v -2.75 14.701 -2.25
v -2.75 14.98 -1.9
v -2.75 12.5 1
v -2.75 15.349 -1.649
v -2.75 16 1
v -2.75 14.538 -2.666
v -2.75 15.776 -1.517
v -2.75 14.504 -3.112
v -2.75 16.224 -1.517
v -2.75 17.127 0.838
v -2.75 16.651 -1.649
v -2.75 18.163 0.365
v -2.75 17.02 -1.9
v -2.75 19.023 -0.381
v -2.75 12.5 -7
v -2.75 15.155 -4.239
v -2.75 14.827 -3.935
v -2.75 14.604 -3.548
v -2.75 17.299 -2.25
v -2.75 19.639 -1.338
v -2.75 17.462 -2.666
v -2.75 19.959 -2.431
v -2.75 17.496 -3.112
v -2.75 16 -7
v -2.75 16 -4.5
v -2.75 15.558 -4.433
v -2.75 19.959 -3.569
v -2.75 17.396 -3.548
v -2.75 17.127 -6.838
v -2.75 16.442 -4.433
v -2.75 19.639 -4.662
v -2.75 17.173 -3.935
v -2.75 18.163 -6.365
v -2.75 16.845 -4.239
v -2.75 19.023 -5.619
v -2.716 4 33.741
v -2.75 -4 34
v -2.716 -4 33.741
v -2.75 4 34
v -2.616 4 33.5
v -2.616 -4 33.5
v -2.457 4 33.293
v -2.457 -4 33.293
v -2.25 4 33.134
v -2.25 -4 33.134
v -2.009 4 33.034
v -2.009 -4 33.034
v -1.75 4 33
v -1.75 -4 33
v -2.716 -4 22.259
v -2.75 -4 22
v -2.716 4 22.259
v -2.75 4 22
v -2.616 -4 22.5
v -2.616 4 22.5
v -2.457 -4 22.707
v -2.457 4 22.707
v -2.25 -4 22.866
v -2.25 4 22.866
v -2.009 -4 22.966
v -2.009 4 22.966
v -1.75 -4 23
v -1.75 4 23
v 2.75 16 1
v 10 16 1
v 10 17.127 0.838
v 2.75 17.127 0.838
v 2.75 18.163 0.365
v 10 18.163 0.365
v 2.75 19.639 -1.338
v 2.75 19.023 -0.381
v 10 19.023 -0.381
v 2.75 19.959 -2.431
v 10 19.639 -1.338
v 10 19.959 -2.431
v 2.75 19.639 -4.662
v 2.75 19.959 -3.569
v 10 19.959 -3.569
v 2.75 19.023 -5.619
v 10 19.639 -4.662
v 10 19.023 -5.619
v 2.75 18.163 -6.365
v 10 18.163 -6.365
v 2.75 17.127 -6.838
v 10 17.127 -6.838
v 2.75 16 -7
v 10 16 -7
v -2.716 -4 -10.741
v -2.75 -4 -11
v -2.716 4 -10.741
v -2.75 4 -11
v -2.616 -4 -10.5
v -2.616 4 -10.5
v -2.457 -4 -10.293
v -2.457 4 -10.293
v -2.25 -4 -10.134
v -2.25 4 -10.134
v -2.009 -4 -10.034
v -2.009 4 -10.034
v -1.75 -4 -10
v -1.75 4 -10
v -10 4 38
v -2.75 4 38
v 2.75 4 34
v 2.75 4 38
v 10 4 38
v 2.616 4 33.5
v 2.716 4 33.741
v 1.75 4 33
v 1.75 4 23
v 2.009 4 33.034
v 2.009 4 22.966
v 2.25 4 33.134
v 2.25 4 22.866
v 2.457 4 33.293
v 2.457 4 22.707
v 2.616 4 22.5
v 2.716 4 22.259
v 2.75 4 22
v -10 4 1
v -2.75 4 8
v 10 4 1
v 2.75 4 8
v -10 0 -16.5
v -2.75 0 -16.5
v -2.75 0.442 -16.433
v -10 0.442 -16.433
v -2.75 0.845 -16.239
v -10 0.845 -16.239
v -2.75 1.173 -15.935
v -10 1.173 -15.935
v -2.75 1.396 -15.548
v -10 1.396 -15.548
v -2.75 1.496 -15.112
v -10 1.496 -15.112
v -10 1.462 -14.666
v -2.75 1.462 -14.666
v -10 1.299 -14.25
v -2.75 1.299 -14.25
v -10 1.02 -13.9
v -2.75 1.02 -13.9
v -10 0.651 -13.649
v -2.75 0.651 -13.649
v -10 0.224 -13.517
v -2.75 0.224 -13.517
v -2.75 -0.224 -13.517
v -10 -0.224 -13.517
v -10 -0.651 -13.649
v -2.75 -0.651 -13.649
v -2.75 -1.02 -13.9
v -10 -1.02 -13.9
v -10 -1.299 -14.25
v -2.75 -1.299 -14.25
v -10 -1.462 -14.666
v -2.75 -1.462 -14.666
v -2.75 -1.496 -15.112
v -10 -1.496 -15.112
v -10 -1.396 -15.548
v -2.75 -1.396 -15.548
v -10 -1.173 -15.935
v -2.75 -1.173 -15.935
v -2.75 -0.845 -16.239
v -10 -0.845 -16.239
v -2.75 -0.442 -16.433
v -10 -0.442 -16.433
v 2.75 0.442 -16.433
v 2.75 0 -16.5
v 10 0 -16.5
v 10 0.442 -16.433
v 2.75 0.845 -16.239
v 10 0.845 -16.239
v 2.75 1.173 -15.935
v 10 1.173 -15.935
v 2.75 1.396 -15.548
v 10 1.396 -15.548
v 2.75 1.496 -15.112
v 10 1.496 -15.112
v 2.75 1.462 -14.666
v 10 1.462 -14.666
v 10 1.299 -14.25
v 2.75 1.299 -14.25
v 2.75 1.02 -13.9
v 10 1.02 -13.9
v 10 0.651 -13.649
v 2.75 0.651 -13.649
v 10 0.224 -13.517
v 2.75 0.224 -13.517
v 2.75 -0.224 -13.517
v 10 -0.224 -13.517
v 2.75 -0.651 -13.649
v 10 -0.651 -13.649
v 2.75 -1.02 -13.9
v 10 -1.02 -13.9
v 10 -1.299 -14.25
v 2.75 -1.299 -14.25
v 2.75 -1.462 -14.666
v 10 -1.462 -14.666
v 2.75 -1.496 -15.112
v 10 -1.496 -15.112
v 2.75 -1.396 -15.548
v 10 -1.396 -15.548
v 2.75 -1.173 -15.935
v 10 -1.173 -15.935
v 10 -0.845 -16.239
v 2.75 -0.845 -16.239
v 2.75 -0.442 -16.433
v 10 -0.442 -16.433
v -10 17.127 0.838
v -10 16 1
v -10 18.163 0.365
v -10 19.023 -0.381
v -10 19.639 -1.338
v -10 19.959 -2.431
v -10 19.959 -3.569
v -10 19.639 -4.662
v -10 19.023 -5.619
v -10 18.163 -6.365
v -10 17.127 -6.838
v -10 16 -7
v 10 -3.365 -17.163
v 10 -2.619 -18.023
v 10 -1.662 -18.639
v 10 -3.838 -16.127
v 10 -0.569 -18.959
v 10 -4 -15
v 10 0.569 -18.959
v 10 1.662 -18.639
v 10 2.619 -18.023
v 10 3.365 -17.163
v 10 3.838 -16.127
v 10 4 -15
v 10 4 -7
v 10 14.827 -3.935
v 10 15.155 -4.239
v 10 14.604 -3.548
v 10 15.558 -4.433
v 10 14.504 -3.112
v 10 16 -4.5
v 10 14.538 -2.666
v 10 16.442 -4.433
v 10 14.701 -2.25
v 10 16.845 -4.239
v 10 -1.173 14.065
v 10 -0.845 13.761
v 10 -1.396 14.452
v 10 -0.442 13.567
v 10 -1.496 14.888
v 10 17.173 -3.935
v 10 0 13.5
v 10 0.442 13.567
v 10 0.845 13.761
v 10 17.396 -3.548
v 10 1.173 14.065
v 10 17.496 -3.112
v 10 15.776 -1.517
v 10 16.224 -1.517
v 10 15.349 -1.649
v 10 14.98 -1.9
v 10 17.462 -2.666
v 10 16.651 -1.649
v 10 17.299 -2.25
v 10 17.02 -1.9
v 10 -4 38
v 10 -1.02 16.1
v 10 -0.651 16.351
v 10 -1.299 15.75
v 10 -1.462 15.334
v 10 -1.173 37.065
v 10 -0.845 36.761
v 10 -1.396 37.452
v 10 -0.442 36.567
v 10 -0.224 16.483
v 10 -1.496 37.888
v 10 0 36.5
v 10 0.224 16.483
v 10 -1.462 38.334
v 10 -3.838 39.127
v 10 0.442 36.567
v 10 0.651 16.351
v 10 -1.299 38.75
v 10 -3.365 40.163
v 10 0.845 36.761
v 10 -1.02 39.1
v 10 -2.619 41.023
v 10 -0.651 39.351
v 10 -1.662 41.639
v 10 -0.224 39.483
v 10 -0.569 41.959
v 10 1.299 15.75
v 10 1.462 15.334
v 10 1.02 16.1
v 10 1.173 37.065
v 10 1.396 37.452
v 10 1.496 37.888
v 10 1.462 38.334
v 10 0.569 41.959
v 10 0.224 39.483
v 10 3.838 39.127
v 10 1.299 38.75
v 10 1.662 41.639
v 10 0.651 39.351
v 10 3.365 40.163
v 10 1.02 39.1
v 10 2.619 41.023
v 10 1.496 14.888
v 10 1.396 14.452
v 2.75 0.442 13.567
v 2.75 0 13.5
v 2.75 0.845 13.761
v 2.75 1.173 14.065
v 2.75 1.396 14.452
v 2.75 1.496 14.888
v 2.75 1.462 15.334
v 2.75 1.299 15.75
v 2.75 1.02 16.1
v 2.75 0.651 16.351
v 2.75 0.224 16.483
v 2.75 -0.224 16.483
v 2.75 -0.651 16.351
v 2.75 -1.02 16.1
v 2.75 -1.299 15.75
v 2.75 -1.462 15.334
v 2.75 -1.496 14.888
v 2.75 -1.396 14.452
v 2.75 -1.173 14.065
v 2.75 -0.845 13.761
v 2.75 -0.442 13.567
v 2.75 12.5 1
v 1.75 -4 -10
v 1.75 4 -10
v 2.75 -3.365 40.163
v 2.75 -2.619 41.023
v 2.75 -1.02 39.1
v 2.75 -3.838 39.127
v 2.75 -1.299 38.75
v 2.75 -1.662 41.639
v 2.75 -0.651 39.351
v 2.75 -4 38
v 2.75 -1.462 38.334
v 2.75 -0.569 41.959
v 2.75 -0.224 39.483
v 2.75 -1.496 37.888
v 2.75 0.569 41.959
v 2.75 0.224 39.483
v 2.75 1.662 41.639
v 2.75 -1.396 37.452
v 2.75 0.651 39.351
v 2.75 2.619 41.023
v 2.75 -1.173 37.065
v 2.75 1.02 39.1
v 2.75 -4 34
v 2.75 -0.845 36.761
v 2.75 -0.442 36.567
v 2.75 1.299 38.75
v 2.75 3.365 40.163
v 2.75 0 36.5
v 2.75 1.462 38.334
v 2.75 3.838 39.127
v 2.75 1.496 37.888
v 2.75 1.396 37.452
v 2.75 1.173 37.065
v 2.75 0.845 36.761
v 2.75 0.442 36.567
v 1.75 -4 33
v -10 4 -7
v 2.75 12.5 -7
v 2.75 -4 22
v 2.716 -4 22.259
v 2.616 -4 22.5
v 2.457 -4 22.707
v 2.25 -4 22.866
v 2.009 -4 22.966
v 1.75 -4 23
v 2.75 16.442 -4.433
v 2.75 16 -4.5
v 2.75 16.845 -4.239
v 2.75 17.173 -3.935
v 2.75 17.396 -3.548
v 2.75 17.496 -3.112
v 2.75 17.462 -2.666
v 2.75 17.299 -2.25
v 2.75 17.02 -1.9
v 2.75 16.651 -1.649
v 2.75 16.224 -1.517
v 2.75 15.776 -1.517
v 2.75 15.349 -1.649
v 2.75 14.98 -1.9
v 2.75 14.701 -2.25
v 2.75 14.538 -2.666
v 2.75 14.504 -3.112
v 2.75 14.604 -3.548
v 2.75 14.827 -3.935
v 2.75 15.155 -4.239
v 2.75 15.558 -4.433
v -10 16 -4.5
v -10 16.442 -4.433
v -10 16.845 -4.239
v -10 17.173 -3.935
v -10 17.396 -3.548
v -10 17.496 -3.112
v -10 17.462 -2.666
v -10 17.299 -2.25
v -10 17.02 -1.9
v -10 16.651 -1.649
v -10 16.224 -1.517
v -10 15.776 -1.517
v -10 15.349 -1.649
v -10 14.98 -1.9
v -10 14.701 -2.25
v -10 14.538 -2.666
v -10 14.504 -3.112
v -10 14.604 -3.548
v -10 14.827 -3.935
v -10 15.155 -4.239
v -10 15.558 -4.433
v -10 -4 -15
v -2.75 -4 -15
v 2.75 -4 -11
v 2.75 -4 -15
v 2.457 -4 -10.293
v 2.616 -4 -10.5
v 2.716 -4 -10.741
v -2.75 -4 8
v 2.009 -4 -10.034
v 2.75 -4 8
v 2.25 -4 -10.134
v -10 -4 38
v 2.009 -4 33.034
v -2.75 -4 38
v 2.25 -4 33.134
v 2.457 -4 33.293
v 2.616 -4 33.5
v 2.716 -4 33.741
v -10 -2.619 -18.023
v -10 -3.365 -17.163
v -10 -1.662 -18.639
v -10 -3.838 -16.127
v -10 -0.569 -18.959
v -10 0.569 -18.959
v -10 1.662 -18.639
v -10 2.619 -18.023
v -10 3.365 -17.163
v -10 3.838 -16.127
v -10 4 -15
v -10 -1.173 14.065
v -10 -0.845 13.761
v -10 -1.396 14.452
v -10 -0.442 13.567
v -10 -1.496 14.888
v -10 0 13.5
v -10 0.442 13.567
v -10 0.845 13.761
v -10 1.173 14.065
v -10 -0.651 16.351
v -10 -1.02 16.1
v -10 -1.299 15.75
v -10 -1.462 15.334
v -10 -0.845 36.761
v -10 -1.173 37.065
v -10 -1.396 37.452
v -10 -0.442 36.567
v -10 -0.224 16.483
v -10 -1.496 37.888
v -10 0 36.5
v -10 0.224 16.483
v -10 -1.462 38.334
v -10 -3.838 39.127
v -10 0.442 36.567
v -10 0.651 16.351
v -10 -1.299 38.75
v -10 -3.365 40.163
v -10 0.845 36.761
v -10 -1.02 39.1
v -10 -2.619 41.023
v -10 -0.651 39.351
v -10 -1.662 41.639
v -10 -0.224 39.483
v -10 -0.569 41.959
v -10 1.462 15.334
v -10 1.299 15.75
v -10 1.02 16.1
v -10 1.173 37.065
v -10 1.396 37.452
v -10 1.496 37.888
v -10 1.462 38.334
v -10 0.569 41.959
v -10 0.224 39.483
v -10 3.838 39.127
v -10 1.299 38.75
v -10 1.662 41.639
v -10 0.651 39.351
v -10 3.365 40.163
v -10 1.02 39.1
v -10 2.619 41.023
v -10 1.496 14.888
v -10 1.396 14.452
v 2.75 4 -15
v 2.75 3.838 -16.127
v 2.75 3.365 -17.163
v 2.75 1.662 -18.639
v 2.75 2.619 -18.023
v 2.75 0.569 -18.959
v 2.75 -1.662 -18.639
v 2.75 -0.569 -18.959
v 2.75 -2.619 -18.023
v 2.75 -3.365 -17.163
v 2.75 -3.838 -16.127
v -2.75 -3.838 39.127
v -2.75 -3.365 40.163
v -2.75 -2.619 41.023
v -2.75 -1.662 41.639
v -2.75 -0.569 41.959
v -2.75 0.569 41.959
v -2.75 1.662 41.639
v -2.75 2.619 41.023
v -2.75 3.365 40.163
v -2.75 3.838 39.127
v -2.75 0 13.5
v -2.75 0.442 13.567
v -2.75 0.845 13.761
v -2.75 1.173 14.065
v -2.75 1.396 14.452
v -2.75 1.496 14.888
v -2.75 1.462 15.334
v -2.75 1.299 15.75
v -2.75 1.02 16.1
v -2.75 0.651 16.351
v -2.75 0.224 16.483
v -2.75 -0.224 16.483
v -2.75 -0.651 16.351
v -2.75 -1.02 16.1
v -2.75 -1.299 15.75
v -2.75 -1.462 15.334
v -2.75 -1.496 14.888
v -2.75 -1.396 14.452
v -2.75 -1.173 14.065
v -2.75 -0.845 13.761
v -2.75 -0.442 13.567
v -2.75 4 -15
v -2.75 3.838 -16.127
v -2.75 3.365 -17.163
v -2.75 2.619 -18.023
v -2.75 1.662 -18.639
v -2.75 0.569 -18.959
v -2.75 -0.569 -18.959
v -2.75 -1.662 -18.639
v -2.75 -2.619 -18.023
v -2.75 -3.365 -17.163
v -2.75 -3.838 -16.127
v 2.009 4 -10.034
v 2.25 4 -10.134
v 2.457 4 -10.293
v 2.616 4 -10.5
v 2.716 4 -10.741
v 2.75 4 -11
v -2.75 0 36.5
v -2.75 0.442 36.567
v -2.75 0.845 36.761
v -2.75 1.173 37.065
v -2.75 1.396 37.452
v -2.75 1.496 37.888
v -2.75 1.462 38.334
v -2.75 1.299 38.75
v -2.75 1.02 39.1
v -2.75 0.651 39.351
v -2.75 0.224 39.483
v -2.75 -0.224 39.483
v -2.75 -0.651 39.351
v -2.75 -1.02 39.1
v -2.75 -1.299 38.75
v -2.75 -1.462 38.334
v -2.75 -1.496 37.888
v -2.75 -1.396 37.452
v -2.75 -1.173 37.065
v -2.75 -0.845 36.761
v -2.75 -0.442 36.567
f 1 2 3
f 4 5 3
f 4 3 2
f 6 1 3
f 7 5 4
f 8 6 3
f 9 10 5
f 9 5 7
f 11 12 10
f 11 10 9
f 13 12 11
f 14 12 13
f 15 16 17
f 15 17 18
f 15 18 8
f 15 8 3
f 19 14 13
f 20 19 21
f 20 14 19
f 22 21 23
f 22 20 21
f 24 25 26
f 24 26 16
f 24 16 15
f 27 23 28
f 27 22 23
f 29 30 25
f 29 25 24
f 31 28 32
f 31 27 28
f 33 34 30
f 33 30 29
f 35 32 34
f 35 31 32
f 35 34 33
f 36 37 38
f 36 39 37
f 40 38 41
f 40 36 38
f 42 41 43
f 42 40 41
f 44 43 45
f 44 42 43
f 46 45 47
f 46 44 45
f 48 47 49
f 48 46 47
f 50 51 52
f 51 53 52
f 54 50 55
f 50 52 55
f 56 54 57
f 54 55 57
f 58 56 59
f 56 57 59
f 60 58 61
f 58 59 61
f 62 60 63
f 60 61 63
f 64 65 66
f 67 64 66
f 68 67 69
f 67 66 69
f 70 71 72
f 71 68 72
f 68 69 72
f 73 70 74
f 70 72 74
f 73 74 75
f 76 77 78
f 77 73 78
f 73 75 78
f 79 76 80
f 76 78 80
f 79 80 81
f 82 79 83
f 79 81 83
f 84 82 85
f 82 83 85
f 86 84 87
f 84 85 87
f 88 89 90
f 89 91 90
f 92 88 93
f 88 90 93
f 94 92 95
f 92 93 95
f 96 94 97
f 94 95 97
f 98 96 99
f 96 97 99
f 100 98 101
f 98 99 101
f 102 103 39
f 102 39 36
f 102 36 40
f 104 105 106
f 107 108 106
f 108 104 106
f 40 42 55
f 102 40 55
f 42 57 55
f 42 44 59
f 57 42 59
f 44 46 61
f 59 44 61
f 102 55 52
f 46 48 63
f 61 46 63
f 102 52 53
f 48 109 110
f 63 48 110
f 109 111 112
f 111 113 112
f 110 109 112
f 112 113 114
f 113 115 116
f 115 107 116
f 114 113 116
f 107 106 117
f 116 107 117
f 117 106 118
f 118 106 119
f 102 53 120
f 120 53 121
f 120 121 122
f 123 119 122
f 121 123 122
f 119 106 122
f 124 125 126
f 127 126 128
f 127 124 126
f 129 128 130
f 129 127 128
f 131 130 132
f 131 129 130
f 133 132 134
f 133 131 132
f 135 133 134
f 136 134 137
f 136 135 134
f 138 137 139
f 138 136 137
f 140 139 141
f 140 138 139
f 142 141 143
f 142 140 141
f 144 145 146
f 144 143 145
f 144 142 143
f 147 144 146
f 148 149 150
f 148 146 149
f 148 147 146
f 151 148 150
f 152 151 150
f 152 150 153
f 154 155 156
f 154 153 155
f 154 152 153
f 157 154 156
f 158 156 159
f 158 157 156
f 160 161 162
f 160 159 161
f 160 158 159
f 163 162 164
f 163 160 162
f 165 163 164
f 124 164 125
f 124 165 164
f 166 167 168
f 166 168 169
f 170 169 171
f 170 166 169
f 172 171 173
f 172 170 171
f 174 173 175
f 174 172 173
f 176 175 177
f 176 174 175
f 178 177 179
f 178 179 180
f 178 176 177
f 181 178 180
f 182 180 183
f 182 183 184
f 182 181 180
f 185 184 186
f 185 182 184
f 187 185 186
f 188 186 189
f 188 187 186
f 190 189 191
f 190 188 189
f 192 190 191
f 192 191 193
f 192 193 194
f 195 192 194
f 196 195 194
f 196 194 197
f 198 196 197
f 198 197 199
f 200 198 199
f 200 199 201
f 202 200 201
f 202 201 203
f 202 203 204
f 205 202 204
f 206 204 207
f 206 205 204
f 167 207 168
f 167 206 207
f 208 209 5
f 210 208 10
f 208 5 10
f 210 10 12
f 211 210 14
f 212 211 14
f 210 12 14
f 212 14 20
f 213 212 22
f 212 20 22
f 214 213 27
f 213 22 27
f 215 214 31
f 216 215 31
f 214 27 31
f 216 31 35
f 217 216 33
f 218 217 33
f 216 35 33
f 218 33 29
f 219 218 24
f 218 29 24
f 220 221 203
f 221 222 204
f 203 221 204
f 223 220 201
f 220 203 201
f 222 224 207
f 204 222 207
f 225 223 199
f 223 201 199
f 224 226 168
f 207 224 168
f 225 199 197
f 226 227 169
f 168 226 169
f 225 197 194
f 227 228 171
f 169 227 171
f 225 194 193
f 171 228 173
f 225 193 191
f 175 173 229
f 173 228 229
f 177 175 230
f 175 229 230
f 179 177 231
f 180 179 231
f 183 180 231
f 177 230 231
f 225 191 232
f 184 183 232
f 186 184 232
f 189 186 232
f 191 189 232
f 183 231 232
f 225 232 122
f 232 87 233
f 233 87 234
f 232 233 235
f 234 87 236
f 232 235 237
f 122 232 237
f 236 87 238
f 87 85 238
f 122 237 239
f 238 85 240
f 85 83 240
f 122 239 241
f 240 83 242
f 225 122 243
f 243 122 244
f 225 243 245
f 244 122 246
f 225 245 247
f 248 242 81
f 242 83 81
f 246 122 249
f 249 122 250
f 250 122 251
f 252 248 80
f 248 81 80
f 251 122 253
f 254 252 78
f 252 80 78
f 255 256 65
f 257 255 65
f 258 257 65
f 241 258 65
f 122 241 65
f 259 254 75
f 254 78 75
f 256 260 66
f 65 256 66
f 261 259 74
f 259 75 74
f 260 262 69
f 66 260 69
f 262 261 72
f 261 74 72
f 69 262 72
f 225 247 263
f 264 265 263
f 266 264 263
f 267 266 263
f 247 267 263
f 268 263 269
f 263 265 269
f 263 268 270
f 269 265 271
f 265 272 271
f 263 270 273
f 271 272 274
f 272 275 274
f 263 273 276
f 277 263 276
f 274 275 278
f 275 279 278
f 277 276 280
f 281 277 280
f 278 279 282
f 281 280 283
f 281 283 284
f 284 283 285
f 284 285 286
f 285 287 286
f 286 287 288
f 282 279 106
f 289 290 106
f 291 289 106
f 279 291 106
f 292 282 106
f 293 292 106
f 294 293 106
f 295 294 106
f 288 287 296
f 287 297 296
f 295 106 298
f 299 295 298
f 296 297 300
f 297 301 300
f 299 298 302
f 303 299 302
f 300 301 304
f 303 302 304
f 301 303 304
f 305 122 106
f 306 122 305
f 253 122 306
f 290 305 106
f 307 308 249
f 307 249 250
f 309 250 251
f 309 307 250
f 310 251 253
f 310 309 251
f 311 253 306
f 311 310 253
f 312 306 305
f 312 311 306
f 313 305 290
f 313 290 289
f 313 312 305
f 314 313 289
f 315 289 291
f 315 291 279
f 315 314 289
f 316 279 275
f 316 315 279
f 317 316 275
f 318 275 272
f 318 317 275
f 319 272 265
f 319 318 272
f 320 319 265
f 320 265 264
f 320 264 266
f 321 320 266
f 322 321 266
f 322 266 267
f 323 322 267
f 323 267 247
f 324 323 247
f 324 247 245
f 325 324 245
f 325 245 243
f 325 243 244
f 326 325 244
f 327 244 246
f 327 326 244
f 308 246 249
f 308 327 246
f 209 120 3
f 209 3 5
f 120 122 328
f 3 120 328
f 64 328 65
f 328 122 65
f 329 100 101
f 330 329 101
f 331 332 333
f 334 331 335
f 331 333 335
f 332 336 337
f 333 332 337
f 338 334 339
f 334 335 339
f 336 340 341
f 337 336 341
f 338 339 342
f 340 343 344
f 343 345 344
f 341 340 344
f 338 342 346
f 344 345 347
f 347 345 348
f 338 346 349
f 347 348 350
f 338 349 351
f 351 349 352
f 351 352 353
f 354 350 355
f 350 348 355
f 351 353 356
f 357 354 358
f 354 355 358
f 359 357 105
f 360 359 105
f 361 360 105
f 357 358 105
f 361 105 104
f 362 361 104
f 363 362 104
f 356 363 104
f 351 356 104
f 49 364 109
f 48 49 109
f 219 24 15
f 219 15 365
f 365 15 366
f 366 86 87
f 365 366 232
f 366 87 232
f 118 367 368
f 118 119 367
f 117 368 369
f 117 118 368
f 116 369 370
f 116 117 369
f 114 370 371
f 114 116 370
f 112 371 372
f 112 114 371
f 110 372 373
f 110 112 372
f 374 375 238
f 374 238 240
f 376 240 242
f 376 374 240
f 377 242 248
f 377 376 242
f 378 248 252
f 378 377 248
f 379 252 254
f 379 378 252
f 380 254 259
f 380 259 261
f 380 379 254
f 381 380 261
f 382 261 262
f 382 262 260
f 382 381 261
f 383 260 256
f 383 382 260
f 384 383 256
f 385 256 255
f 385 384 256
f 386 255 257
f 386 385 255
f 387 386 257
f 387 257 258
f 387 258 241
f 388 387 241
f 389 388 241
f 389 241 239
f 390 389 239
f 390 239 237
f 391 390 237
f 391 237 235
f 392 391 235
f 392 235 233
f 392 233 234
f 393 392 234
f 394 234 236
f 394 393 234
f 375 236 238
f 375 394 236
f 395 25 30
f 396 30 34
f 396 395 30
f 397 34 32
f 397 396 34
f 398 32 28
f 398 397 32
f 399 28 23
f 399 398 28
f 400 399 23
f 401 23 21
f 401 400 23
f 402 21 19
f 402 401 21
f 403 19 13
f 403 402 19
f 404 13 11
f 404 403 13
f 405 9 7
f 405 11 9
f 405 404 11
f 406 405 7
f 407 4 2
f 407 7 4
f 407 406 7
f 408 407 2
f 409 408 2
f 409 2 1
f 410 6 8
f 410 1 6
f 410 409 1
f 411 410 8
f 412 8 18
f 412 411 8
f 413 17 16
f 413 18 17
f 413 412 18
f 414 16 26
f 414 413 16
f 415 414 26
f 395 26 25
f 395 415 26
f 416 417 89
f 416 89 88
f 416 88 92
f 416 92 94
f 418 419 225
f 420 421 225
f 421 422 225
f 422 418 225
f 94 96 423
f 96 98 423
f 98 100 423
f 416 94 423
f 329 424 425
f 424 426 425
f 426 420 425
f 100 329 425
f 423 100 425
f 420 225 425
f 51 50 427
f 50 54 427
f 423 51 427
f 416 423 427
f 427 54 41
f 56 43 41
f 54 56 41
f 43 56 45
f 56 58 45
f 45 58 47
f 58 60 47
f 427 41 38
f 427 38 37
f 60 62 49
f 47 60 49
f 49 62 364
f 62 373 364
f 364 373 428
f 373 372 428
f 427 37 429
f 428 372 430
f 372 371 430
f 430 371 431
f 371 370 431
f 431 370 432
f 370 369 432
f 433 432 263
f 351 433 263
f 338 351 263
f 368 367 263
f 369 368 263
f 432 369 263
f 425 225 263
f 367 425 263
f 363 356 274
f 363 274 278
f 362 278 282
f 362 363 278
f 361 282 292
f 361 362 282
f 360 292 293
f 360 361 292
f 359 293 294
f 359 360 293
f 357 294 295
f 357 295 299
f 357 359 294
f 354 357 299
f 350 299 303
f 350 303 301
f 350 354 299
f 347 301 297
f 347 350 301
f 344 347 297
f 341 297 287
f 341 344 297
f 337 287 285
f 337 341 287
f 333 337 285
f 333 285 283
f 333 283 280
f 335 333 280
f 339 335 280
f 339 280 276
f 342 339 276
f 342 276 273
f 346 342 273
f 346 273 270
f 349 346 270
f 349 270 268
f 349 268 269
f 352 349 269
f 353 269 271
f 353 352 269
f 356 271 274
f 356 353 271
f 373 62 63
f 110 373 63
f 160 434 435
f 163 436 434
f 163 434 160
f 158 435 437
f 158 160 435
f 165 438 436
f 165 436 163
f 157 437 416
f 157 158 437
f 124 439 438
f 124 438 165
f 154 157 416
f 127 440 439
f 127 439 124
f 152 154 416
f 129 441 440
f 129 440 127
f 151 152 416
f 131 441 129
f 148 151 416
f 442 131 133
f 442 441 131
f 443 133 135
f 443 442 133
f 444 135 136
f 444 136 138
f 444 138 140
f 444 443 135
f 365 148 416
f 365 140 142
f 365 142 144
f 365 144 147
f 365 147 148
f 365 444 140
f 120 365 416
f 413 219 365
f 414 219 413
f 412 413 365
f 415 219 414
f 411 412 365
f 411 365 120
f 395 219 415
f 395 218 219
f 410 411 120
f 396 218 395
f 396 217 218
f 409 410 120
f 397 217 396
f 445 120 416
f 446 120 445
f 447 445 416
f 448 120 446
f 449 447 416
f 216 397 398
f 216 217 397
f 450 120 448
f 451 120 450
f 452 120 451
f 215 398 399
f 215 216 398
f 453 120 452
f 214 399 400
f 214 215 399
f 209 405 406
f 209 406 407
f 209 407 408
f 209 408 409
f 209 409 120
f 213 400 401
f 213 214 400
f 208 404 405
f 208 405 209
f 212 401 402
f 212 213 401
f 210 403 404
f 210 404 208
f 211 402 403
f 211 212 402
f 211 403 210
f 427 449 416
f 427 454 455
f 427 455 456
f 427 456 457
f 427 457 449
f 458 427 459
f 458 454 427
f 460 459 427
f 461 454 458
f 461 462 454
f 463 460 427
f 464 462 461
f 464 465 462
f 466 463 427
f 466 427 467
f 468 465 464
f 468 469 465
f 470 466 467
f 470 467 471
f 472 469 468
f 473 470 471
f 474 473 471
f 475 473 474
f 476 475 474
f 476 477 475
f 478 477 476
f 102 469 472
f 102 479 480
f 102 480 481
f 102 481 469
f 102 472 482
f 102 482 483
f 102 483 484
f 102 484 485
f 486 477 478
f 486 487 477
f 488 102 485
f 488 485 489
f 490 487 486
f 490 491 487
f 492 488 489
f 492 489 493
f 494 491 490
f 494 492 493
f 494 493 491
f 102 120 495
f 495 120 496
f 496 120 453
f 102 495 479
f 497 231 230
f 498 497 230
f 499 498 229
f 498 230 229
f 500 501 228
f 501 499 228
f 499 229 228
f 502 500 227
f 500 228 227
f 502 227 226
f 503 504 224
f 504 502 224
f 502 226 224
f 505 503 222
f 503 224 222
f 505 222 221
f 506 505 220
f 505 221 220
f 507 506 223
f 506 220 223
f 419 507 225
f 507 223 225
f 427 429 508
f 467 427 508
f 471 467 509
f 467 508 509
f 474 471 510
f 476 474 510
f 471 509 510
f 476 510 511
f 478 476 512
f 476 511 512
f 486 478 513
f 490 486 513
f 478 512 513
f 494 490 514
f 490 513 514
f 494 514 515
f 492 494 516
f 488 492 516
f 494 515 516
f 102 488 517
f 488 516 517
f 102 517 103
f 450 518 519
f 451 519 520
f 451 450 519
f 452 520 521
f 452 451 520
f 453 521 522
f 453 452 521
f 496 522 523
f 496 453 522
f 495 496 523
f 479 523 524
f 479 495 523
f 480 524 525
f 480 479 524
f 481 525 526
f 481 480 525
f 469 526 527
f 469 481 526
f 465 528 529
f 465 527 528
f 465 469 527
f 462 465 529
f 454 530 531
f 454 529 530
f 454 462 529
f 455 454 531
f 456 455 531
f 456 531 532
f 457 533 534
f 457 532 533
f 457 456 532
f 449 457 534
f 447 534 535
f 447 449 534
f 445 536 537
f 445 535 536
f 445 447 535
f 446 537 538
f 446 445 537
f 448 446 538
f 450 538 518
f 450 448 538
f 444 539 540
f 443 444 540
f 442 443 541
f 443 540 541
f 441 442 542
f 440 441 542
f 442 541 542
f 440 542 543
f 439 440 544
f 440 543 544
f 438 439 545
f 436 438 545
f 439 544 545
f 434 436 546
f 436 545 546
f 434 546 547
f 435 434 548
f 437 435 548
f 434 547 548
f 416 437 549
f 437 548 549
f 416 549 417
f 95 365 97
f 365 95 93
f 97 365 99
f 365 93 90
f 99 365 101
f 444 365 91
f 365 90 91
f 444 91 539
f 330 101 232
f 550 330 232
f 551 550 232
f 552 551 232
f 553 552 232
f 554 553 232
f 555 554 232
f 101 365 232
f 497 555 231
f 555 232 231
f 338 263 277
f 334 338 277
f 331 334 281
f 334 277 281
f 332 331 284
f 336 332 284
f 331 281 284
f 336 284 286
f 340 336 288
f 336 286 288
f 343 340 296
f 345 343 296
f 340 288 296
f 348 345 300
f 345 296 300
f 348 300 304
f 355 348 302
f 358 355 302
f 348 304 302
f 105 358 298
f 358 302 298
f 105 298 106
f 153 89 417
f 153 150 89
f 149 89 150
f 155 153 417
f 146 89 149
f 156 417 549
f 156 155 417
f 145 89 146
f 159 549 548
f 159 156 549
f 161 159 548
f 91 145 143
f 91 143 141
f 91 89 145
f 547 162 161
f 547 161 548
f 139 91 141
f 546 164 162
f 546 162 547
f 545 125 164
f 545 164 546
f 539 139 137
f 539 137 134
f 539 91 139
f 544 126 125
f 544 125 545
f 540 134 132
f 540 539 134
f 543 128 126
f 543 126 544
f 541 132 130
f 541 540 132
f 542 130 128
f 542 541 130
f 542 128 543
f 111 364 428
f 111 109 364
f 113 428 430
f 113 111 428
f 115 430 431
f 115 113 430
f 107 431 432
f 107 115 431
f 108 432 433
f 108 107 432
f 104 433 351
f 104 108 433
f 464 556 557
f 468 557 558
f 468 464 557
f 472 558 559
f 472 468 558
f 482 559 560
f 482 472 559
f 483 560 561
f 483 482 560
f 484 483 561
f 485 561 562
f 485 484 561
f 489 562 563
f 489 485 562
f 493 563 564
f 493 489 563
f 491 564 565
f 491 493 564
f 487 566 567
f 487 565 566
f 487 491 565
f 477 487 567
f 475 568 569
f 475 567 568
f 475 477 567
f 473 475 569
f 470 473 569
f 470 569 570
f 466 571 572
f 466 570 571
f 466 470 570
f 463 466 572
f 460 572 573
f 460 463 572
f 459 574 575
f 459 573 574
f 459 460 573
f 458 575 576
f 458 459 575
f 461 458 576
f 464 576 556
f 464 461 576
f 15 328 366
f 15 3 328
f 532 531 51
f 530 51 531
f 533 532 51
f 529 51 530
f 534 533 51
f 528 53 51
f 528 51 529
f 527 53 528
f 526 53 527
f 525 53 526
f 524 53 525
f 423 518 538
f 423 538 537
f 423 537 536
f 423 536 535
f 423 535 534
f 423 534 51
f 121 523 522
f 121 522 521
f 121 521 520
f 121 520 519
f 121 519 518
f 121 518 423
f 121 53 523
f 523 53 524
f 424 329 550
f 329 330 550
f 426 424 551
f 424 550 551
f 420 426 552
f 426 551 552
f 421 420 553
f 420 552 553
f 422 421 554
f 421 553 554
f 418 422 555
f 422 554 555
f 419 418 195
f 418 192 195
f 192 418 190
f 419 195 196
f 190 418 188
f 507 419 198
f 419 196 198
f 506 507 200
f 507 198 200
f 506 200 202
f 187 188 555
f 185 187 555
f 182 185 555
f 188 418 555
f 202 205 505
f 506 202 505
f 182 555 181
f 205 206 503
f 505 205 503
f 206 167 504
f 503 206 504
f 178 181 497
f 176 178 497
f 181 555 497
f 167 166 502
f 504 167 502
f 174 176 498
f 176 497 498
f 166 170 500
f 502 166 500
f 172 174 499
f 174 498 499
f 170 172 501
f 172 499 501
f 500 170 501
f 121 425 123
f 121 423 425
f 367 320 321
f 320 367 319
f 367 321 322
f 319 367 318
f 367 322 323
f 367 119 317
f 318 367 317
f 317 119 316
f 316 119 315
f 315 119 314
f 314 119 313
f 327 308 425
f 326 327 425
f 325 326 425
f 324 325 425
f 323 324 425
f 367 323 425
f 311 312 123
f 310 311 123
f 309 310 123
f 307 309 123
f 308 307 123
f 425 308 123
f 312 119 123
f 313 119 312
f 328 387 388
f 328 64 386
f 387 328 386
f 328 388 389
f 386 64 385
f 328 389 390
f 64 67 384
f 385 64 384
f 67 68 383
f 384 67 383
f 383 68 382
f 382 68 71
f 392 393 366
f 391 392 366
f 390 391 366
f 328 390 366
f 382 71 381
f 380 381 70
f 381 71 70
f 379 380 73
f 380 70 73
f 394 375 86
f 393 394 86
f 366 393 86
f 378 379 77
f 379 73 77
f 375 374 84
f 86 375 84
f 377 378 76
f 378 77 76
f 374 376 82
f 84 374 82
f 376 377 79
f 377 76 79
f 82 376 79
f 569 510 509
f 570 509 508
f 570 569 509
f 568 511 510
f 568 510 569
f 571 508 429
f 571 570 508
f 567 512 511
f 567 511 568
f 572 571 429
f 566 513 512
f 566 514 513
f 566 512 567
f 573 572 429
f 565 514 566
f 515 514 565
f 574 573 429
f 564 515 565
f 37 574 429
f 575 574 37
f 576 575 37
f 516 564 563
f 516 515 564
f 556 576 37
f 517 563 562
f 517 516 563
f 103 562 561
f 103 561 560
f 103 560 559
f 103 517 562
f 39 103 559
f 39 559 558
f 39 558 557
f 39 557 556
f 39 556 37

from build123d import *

# Parameters (mm, degrees)
CROQUIS1_R              = 1.5
SALIENTE_EXTRUIR1_DEPTH = 10
CROQUIS2_W              = 8
CROQUIS2_H              = 7.5
CROQUIS2_W_2            = 15
CROQUIS2_H_2            = 8
CROQUIS2_W_3            = 9
CORTAR_EXTRUIR1_DEPTH   = 2.75
REDONDEO1_R             = 1


with BuildPart() as part:
    # Croquis1 → Saliente-Extruir1 (new, symmetric)
    with BuildSketch(Plane(origin=(0, 0, 0), x_dir=(0, 0, -1), z_dir=(1, 0, 0))):
        with BuildLine():
            Line((-15, 4), (-1, 4))
            Line((-1, 4), (-1, 16))
            ThreePointArc((-1, 16), (3, 20), (7, 16))
            Line((7, 16), (7, 4))
            Line((7, 4), (15, 4))
            ThreePointArc((15, 4), (19, 0), (15, -4))
            Line((15, -4), (-15, -4))
            Line((-15, -4), (-38, -4))
            ThreePointArc((-38, -4), (-42, 0), (-38, 4))
            Line((-38, 4), (-15, 4))
        make_face()
        with Locations((15, 0)):
            Circle(CROQUIS1_R, mode=Mode.SUBTRACT)
        with Locations((3, 16)):
            Circle(CROQUIS1_R, mode=Mode.SUBTRACT)
        with Locations((-15, 0)):
            Circle(CROQUIS1_R, mode=Mode.SUBTRACT)
        with Locations((-38, 0)):
            Circle(CROQUIS1_R, mode=Mode.SUBTRACT)
    extrude(amount=SALIENTE_EXTRUIR1_DEPTH, both=True)

    # Croquis2 → Cortar-Extruir1 (cut, symmetric)
    with BuildSketch(Plane(origin=(0, 0, 0), x_dir=(0, 0, -1), z_dir=(1, 0, 0))):
        with Locations((3, 16.25)):
            Rectangle(CROQUIS2_W, CROQUIS2_H)
        with Locations((-15.5, 0)):
            Rectangle(CROQUIS2_W_2, CROQUIS2_H_2)
        with Locations((14.5, 0)):
            Rectangle(CROQUIS2_W_3, CROQUIS2_H_2)
        with Locations((-37.5, 0)):
            Rectangle(CROQUIS2_W_3, CROQUIS2_H_2)
    extrude(amount=CORTAR_EXTRUIR1_DEPTH, both=True, mode=Mode.SUBTRACT)

    # Redondeo1
    redondeo1_edges = [part.edges().sort_by_distance(p)[0] for p in [
        (2.75, 0, -10),
        (-2.75, 0, -10),
        (-2.75, 0, 23),
        (2.75, 0, 23),
        (2.75, 0, 33),
        (-2.75, 0, 33),
    ]]
    fillet(redondeo1_edges, radius=REDONDEO1_R)


solid = part.part
